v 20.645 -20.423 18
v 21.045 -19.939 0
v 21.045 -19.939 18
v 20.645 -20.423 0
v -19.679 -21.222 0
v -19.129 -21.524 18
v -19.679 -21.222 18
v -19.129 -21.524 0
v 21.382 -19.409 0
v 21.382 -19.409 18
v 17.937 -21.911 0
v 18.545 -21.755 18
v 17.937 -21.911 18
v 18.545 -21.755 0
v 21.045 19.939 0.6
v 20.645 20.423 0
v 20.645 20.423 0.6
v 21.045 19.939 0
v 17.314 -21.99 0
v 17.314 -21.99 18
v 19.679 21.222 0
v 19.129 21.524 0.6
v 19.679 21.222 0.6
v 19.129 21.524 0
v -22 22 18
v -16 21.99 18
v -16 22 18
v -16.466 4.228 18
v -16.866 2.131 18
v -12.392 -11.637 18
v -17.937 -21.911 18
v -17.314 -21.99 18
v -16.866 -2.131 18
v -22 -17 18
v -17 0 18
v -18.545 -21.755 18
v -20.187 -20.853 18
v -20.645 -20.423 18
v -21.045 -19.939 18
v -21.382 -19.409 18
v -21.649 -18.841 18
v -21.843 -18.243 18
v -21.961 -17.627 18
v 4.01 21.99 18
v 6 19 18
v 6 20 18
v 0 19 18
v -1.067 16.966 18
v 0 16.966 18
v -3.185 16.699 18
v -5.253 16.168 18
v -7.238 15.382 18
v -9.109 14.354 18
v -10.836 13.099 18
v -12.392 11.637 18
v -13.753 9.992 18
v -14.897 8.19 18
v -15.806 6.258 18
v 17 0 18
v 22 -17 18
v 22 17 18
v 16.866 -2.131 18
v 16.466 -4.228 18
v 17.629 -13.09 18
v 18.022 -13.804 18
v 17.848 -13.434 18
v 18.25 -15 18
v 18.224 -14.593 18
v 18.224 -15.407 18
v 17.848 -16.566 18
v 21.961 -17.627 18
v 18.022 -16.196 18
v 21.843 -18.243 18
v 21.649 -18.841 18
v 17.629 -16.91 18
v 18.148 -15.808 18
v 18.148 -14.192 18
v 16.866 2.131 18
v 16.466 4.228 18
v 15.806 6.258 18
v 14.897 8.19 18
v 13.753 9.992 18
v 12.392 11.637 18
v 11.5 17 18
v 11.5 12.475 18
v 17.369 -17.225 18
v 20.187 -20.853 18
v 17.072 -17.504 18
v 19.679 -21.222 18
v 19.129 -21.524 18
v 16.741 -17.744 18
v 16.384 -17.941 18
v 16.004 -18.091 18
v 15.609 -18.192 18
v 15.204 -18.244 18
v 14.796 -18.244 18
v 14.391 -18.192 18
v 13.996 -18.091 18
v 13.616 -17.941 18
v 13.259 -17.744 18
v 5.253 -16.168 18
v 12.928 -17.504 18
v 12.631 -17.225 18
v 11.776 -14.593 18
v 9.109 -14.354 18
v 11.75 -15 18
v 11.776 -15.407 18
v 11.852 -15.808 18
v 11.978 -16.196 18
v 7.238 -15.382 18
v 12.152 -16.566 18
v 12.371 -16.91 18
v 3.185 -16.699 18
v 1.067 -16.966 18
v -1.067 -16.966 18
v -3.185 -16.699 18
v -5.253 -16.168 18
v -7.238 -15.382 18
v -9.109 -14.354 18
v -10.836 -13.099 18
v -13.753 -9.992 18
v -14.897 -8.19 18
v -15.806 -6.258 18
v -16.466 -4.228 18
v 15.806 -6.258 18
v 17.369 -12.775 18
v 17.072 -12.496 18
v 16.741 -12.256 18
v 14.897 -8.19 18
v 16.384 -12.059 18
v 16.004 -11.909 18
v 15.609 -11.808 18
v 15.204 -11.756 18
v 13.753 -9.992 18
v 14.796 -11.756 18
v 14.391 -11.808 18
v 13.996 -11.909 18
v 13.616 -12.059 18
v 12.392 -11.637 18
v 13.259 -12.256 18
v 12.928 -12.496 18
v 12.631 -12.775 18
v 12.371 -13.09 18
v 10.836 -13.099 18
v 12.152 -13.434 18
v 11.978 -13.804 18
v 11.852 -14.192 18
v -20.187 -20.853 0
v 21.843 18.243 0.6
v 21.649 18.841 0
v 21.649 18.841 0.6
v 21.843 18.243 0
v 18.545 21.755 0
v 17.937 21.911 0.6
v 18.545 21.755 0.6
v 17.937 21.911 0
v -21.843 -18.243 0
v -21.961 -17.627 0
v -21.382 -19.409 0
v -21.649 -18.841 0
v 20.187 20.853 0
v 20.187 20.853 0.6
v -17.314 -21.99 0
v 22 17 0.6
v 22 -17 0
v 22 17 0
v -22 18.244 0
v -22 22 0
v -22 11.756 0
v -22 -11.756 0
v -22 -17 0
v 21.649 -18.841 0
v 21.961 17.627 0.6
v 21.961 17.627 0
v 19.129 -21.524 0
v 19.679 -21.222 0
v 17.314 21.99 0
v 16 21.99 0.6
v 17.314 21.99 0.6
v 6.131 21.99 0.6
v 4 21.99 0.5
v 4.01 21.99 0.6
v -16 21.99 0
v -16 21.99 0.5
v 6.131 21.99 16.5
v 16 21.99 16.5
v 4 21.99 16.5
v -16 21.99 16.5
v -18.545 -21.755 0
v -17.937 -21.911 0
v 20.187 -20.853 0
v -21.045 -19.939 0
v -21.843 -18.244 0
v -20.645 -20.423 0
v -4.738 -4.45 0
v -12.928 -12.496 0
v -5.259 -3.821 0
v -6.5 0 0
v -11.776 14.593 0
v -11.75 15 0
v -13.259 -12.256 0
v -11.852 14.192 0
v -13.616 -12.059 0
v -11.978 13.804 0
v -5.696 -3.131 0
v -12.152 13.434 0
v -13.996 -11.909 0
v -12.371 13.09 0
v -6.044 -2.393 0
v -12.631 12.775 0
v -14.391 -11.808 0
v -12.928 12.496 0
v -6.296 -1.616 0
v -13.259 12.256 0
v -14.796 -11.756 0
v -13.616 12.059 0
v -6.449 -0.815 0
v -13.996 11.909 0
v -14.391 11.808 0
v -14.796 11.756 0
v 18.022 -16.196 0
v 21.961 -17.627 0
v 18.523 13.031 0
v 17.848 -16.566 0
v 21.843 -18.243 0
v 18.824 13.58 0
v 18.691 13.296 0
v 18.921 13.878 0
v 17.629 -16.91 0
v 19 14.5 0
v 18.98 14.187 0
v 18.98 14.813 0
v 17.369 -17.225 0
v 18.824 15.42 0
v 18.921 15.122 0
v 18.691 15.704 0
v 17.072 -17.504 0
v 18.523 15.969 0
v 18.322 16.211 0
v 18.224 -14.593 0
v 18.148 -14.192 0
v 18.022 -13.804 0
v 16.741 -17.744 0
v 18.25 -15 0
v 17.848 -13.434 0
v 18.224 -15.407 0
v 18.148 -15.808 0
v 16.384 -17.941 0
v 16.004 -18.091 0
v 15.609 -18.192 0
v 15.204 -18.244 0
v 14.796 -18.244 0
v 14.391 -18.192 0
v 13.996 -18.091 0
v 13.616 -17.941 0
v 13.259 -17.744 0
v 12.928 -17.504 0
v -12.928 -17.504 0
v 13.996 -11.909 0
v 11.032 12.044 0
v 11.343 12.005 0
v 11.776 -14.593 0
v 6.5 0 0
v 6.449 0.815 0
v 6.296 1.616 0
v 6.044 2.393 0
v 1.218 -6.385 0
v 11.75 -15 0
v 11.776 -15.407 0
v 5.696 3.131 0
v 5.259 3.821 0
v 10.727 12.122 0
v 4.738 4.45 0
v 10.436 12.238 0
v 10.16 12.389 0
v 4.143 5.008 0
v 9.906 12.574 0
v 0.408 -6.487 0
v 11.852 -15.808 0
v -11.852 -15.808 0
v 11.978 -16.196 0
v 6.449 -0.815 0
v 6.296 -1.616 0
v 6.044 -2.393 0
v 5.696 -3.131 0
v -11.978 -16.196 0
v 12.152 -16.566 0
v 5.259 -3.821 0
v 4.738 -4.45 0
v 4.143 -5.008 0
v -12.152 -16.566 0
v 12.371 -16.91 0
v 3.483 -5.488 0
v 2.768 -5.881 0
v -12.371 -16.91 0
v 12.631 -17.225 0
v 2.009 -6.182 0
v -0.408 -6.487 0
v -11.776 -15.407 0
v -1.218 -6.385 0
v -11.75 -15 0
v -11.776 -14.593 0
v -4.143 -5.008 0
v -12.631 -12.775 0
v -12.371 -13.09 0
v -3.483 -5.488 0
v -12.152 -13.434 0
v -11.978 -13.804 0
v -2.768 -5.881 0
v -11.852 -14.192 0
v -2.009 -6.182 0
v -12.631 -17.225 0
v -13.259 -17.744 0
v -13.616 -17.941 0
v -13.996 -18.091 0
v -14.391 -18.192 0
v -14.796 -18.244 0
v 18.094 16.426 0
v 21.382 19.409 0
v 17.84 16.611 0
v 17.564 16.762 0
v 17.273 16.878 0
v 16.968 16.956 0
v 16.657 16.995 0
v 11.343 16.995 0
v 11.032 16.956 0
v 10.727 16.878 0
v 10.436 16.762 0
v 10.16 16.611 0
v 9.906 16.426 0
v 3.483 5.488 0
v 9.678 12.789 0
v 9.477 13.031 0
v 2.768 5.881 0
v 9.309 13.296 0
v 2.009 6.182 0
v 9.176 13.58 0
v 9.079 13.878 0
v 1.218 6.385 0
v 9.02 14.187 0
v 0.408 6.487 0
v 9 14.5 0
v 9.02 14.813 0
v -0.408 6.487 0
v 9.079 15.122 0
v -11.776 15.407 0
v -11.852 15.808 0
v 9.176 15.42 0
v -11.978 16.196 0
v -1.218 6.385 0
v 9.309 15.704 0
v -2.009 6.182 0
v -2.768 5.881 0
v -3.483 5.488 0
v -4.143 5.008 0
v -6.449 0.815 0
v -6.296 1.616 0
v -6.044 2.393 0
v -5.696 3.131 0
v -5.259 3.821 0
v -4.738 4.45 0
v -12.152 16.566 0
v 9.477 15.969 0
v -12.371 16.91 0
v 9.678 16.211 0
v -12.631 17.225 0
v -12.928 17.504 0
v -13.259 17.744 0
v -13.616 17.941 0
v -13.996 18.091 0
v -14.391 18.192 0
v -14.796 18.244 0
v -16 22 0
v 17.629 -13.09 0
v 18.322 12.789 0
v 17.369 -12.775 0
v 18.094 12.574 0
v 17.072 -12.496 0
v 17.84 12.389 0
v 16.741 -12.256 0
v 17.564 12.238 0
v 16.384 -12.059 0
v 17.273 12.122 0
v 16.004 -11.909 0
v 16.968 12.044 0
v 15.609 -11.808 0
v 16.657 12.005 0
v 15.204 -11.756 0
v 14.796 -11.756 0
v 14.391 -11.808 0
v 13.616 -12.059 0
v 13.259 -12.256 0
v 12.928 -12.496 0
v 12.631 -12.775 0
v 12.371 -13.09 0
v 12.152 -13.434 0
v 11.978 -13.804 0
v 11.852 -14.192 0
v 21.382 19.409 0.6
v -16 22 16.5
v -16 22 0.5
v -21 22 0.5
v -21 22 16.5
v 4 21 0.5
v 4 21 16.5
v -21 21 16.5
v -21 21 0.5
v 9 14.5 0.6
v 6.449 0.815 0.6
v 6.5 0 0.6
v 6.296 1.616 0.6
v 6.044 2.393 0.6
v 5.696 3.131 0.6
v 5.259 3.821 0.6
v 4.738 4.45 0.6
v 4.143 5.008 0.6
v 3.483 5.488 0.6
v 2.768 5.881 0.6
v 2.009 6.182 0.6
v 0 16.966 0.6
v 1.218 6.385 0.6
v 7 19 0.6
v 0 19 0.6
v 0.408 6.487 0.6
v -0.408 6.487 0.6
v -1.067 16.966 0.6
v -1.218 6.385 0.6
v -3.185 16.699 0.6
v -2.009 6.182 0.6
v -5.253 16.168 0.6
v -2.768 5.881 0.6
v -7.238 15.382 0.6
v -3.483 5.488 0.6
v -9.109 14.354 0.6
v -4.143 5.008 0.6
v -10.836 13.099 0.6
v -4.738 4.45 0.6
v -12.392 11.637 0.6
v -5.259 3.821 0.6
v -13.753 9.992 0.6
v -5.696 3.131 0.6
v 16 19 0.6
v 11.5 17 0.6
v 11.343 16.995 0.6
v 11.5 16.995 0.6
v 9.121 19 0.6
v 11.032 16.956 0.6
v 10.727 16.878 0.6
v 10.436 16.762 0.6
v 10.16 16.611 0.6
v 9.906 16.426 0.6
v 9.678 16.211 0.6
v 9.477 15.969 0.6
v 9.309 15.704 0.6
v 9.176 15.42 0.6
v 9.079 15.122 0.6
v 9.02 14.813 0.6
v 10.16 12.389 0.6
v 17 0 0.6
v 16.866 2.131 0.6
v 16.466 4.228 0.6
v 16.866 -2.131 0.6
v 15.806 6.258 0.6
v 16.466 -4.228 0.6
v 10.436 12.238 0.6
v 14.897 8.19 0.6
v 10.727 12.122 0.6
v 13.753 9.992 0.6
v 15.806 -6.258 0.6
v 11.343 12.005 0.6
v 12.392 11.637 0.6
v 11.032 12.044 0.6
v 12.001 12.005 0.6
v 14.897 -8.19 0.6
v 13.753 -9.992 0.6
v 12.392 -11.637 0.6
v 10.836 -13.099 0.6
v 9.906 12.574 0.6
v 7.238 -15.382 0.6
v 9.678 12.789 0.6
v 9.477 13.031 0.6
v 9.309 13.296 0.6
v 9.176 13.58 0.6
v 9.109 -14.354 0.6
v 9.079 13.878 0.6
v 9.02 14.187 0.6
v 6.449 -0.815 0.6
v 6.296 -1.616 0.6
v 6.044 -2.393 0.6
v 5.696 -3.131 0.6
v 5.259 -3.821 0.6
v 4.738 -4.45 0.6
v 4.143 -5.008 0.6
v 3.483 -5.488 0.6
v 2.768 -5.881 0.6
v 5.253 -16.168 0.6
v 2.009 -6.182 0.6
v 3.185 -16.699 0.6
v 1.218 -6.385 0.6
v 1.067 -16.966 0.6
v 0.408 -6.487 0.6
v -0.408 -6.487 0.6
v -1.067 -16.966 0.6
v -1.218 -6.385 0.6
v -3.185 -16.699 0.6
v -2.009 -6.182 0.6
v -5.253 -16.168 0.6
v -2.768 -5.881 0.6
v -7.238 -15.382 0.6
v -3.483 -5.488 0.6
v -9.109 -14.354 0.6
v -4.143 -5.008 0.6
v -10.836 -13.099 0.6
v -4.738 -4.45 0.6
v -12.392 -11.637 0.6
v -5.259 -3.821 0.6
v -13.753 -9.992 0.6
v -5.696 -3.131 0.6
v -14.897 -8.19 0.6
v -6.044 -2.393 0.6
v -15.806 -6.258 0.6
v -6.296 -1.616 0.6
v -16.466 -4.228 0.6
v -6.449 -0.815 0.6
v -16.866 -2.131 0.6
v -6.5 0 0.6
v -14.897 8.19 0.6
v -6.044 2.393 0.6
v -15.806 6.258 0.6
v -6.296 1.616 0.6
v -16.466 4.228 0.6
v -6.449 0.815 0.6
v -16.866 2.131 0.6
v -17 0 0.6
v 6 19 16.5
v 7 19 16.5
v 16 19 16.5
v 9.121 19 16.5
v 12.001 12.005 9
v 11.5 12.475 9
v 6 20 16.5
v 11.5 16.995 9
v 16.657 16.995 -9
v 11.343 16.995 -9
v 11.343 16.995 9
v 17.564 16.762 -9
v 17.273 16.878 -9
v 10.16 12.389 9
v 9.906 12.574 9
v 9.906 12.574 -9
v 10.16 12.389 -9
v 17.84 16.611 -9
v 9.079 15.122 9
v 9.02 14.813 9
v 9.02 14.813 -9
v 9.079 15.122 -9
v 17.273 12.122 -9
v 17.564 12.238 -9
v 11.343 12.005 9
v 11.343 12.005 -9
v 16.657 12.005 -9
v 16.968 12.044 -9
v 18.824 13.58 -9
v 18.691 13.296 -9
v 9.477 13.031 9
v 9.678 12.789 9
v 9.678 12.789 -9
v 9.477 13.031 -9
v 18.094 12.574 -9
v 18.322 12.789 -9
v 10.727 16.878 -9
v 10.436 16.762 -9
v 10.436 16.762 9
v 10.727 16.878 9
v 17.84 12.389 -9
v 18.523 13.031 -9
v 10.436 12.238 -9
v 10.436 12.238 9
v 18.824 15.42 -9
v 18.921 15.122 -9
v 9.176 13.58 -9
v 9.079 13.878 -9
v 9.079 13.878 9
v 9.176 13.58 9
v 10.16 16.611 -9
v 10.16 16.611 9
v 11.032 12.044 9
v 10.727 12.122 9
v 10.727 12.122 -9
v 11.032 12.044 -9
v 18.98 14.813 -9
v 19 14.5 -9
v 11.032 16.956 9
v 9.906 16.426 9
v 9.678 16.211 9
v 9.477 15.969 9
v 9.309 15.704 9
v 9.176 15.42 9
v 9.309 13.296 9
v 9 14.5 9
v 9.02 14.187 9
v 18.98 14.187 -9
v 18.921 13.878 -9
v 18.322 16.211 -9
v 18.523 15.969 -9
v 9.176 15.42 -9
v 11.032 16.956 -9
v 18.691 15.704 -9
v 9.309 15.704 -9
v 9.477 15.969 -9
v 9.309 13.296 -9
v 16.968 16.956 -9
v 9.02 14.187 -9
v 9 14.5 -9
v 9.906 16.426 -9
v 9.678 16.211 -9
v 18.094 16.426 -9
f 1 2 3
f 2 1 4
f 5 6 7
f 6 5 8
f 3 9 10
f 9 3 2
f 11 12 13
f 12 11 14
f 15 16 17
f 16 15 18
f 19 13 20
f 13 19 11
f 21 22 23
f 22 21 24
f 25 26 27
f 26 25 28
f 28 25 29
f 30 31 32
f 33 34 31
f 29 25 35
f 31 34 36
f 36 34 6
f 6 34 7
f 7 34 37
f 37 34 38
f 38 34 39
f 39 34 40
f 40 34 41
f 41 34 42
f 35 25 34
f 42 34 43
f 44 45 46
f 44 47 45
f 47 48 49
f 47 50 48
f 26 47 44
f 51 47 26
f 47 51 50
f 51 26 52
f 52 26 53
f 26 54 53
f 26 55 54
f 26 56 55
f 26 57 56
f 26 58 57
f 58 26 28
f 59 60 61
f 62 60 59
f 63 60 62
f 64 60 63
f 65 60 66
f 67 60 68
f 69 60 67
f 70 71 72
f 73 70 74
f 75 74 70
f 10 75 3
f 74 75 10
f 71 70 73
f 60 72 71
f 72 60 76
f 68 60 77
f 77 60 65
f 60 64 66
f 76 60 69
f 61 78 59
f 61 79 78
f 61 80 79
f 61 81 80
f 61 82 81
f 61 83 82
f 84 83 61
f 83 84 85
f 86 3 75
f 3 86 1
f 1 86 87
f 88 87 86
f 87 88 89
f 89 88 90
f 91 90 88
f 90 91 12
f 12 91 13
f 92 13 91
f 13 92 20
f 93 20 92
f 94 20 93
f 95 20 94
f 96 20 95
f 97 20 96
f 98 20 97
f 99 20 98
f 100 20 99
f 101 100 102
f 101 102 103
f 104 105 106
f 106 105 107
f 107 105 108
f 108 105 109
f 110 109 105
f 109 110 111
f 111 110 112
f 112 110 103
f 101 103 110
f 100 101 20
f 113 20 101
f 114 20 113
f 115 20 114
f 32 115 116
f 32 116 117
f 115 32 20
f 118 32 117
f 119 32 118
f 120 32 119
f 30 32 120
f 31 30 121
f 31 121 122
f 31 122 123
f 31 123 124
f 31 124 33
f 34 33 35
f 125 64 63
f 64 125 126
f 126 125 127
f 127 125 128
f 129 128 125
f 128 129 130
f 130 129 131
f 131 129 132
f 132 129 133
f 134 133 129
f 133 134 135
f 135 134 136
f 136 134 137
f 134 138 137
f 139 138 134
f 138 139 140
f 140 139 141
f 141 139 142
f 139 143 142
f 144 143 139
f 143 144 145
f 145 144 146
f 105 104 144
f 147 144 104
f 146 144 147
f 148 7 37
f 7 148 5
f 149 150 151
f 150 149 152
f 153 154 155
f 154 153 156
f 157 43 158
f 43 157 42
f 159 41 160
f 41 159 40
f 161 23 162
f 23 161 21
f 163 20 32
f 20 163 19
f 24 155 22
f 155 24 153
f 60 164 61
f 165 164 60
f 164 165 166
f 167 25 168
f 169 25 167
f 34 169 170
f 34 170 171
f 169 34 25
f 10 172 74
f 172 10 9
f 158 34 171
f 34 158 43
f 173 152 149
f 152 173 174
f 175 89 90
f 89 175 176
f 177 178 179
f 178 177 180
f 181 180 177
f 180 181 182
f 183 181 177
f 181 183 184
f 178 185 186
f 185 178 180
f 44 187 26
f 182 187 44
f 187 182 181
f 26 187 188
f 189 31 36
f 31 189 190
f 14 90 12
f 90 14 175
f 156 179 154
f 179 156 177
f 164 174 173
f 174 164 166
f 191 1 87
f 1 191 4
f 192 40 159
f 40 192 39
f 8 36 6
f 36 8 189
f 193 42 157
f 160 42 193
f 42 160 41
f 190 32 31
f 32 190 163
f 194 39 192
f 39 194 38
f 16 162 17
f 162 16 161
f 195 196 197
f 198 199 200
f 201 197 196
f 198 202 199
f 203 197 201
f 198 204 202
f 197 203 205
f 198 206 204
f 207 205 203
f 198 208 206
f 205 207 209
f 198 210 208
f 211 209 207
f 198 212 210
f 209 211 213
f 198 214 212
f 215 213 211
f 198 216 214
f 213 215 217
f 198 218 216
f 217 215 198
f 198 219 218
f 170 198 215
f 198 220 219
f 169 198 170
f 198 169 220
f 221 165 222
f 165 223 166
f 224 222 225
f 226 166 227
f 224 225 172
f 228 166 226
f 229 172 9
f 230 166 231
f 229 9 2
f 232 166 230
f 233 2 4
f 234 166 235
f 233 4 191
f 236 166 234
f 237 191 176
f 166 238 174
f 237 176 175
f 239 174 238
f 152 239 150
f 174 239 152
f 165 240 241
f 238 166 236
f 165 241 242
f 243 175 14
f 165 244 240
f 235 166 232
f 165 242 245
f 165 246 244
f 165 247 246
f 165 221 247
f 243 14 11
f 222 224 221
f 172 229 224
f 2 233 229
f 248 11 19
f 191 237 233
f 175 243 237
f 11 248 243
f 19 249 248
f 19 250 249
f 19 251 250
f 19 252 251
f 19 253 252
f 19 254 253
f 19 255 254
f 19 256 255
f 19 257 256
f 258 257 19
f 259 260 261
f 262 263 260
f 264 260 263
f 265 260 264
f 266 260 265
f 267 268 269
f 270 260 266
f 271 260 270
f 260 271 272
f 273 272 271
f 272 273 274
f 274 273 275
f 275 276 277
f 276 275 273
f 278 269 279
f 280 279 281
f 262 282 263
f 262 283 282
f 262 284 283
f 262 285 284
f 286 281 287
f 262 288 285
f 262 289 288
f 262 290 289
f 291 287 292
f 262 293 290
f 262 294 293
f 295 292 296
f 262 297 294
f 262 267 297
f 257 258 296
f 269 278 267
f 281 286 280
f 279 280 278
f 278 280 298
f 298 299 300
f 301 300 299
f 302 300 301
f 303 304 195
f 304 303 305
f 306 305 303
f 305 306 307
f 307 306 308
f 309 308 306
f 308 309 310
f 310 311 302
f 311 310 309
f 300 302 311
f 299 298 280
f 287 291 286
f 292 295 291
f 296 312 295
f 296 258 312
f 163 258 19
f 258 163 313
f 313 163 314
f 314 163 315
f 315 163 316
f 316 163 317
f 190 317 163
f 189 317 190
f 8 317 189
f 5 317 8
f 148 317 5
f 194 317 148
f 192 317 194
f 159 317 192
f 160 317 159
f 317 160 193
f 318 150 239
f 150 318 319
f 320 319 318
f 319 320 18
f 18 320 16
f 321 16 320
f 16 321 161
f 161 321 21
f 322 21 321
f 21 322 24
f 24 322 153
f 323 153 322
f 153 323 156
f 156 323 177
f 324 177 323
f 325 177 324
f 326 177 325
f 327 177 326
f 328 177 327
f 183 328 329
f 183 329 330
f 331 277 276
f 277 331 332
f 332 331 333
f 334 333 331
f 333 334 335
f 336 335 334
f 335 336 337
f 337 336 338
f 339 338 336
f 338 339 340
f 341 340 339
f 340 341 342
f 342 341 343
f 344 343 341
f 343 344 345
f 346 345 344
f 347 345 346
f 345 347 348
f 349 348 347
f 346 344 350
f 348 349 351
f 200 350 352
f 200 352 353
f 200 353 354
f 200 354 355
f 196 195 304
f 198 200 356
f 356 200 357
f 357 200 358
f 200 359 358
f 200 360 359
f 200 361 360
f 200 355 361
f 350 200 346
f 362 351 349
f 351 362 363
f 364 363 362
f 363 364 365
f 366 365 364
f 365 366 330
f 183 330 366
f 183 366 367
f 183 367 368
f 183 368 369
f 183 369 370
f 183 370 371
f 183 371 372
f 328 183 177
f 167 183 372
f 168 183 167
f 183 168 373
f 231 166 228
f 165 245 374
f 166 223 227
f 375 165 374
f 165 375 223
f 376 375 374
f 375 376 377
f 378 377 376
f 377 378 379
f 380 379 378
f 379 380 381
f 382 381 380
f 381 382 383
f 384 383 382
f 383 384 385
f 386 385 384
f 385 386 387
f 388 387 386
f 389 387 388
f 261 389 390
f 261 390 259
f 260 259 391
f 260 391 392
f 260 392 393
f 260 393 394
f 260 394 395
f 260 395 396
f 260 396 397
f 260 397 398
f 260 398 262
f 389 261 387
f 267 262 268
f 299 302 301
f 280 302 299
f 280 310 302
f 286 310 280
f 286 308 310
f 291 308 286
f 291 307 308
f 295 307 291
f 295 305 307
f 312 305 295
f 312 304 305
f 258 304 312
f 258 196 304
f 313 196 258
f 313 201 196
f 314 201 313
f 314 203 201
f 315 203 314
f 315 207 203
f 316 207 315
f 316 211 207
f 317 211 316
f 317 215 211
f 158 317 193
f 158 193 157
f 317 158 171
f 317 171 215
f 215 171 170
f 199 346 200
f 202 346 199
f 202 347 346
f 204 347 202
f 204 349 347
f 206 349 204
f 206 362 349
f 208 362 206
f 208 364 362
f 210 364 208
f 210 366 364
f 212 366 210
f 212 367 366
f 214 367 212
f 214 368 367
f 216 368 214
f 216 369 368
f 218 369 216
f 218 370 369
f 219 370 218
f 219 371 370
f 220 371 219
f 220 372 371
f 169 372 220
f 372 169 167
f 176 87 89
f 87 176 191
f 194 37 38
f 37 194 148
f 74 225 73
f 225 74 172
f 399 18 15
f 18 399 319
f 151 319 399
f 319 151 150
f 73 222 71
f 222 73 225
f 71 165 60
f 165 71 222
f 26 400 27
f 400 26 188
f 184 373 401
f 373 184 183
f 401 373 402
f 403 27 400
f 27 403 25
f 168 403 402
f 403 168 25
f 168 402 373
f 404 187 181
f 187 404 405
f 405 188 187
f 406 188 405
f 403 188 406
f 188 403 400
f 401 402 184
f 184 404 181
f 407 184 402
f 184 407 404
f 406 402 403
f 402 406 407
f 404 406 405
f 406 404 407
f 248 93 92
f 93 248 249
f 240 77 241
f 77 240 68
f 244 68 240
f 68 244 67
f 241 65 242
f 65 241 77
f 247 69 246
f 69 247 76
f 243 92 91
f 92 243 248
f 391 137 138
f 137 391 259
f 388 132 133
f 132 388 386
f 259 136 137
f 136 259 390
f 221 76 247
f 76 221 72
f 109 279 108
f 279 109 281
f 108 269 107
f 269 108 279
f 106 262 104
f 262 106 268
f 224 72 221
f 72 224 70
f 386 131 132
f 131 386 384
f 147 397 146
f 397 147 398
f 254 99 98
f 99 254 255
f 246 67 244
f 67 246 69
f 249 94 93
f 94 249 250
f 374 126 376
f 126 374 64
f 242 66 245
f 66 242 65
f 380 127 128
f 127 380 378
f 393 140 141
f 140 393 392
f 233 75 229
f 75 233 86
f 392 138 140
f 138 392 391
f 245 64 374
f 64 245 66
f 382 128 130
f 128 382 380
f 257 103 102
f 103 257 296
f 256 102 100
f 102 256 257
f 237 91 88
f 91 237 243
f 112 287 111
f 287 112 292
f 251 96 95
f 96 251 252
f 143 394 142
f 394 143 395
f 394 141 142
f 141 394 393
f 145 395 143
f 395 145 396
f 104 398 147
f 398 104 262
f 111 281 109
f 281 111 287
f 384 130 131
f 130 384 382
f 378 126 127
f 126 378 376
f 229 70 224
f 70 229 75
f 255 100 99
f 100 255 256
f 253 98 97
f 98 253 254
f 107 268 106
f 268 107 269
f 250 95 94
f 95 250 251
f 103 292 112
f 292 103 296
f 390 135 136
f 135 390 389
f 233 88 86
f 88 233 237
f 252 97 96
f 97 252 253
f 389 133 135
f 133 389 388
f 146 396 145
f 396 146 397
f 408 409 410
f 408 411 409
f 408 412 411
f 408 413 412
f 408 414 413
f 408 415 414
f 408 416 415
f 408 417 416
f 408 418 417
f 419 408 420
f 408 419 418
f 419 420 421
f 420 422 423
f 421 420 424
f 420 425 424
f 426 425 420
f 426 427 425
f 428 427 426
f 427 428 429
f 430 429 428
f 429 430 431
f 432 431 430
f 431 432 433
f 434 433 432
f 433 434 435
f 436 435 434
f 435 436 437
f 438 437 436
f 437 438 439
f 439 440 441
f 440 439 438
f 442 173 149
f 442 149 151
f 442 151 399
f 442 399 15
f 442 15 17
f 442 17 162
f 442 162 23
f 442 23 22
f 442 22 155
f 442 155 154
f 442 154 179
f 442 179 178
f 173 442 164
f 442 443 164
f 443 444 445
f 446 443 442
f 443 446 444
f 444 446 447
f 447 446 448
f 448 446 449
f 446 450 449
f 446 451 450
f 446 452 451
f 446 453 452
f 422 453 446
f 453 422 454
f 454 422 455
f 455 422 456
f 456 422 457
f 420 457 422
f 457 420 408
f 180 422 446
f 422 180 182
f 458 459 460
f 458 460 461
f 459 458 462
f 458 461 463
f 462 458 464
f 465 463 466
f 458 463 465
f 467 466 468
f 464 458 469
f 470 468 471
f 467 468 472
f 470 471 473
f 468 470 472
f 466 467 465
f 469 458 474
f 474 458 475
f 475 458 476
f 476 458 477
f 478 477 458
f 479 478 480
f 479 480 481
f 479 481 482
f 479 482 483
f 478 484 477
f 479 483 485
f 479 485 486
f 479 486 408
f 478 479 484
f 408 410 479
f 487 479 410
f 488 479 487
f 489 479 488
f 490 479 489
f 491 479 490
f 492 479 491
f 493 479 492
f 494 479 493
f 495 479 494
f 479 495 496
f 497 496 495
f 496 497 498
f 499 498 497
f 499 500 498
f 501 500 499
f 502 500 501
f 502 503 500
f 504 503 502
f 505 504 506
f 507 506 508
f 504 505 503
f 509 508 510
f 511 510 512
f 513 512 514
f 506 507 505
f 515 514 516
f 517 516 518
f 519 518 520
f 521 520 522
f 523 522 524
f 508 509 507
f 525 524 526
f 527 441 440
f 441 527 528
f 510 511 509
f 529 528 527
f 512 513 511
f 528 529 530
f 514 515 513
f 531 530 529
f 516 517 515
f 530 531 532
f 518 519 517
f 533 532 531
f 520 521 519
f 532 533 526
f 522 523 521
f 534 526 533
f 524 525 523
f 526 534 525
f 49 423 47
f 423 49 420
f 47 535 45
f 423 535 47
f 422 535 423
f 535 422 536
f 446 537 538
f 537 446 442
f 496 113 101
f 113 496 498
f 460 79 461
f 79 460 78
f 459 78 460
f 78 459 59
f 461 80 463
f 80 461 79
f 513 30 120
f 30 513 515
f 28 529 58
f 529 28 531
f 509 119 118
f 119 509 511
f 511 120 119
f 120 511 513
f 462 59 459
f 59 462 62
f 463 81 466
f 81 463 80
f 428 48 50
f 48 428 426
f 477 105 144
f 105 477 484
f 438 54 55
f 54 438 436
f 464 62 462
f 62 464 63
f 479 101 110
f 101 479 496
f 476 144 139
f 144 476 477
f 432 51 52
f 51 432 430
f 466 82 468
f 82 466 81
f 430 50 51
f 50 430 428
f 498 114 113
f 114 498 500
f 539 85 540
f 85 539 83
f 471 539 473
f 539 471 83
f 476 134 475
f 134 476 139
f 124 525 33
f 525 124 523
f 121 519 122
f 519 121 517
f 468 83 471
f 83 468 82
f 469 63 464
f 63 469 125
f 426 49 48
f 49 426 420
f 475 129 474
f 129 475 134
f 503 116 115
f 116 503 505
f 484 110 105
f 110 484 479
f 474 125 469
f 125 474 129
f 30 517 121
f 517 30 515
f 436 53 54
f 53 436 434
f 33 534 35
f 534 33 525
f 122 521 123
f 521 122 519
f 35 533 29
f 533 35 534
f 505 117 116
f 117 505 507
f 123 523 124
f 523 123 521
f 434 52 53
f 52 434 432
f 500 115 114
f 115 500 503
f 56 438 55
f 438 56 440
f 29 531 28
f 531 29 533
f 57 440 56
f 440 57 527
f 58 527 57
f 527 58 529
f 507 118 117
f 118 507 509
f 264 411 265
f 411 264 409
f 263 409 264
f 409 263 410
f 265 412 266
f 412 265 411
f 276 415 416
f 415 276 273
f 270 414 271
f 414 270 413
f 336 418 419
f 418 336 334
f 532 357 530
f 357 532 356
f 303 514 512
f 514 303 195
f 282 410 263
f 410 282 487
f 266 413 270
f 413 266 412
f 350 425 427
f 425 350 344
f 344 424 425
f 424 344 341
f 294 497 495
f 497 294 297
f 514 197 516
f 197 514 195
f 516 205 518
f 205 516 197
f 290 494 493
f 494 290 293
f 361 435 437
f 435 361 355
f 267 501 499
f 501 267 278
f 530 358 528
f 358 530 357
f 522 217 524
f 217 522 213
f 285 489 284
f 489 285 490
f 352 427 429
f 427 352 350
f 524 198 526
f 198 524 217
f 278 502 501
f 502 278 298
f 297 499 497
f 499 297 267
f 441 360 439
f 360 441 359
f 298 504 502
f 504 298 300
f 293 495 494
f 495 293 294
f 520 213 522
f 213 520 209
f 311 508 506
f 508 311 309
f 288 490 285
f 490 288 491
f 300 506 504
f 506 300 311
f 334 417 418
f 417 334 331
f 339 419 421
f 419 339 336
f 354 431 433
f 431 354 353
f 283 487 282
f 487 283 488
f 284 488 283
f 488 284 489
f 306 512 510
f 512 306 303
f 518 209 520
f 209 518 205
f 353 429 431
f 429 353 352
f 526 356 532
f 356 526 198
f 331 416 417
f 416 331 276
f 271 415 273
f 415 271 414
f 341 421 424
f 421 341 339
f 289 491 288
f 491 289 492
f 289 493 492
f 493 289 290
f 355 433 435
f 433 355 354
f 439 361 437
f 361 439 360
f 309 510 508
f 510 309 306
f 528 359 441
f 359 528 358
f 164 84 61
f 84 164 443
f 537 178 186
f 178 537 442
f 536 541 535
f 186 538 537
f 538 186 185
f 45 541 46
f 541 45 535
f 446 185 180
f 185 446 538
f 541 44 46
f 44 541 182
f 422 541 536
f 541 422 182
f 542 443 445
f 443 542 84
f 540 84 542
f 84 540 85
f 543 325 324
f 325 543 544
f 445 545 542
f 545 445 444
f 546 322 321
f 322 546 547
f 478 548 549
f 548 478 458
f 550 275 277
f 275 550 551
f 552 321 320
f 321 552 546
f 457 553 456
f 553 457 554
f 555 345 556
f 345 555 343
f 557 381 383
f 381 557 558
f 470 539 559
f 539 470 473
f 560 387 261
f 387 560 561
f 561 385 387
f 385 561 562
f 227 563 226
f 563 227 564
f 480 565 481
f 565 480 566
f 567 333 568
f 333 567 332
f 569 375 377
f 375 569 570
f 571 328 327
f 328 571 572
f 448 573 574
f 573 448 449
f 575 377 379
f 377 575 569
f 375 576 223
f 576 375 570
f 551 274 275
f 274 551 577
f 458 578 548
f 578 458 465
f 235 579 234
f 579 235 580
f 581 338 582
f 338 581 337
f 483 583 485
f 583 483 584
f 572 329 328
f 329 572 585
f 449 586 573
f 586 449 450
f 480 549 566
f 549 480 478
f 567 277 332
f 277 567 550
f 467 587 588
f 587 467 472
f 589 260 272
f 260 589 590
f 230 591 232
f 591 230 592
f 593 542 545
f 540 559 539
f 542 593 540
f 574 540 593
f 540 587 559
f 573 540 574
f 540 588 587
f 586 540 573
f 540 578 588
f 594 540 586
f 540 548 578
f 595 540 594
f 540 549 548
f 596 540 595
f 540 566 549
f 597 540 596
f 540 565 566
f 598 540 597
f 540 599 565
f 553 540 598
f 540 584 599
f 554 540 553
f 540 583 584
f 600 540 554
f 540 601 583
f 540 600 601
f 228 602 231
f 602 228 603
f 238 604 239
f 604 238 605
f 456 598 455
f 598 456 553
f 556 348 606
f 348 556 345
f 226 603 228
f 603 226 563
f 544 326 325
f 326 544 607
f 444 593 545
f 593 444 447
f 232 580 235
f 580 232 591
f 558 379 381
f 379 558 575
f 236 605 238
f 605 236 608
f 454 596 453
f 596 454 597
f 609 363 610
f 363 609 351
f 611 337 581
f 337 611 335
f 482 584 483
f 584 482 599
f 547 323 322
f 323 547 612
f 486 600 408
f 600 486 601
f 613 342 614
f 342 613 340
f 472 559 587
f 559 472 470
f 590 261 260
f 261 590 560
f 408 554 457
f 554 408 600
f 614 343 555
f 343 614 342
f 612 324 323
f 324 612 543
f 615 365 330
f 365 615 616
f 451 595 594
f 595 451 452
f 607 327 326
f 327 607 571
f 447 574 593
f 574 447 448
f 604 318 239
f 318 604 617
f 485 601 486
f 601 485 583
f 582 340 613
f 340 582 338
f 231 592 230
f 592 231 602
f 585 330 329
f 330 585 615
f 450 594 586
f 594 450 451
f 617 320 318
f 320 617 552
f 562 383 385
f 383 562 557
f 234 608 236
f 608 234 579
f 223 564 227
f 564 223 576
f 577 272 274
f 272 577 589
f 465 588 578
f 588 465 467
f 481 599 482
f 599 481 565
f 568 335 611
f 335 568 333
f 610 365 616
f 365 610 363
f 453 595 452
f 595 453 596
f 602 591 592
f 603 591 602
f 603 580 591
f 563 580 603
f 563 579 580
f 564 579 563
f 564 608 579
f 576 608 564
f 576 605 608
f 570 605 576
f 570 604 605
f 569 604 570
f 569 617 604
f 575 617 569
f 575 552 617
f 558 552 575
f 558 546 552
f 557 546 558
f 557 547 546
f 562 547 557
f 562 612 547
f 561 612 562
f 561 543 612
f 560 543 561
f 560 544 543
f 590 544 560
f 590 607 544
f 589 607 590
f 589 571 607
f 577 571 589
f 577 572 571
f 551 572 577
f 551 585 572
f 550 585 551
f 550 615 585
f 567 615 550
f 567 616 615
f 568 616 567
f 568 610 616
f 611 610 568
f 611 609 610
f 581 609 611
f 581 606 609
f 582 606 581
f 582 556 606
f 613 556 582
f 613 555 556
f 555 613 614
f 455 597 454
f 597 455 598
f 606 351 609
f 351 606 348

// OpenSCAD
$fn = 50;


union() {
	difference() {
		union() {
			hull() {
				translate(v = [-17.0000000000, 17.0000000000, 0]) {
					cylinder(h = 18, r = 5);
				}
				translate(v = [17.0000000000, 17.0000000000, 0]) {
					cylinder(h = 18, r = 5);
				}
				translate(v = [-17.0000000000, -17.0000000000, 0]) {
					cylinder(h = 18, r = 5);
				}
				translate(v = [17.0000000000, -17.0000000000, 0]) {
					cylinder(h = 18, r = 5);
				}
			}
			translate(v = [-22.0000000000, 16.0000000000, 0]) {
				cube(size = [6, 6, 18]);
			}
		}
		union() {
			translate(v = [-22.5000000000, -15.0000000000, -250.0000000000]) {
				rotate(a = [0, 0, 0]) {
					difference() {
						union() {
							hull() {
								translate(v = [7.5000000000, 0, 0]) {
									cylinder(h = 250, r = 3.2500000000, r1 = 3.2500000000, r2 = 3.2500000000);
								}
								translate(v = [-7.5000000000, 0, 0]) {
									cylinder(h = 250, r = 3.2500000000, r1 = 3.2500000000, r2 = 3.2500000000);
								}
							}
						}
						union();
					}
				}
			}
			translate(v = [-22.5000000000, 15.0000000000, -250.0000000000]) {
				rotate(a = [0, 0, 0]) {
					difference() {
						union() {
							hull() {
								translate(v = [7.5000000000, 0, 0]) {
									cylinder(h = 250, r = 3.2500000000, r1 = 3.2500000000, r2 = 3.2500000000);
								}
								translate(v = [-7.5000000000, 0, 0]) {
									cylinder(h = 250, r = 3.2500000000, r1 = 3.2500000000, r2 = 3.2500000000);
								}
							}
						}
						union();
					}
				}
			}
			translate(v = [-21.0000000000, 21.0000000000, 0.5000000000]) {
				cube(size = [25, 1, 16]);
			}
			translate(v = [15.0000000000, -15.0000000000, 0]) {
				cylinder(h = 100, r = 3.2500000000);
			}
			translate(v = [0.0000000000, 11.0000000000, 0.6000000000]) {
				cube(size = [11, 8, 20.4000000000]);
			}
			translate(v = [0, 0, 0.6000000000]) {
				cylinder(h = 20.4000000000, r = 17.0000000000);
			}
			translate(v = [0, 0, -9.0000000000]) {
				cylinder(h = 18, r = 6.5000000000);
			}
			translate(v = [0.0000000000, 17.0000000000, 0.6000000000]) {
				cube(size = [22.0000000000, 2, 20.4000000000]);
			}
			translate(v = [16.0000000000, 17.0000000000, 0.6000000000]) {
				cube(size = [6, 5, 20.4000000000]);
			}
			translate(v = [6.0000000000, 17.0000000000, 16.5000000000]) {
				cube(size = [16, 5, 1.5000000000]);
			}
			translate(v = [3.2500000000, 22.7500000000, 0.6000000000]) {
				rotate(a = [0, 0, -45]) {
					cube(size = [7.5000000000, 1.5000000000, 20.4000000000]);
				}
			}
			translate(v = [2.5000000000, 12.0000000000, 0.6000000000]) {
				cube(size = [9.0000000000, 5, 17.4000000000]);
			}
		}
	}
	union() {
		translate(v = [14, 14.5000000000, -9.0000000000]) {
			rotate(a = [0, 0, 0]) {
				difference() {
					union() {
						#hull() {
							#translate(v = [2.5000000000, 0, 0]) {
								cylinder(h = 18, r = 2.5000000000, r1 = 2.5000000000, r2 = 2.5000000000);
							}
							#translate(v = [-2.5000000000, 0, 0]) {
								cylinder(h = 18, r = 2.5000000000, r1 = 2.5000000000, r2 = 2.5000000000);
							}
						}
					}
					union();
				}
			}
		}
	}
}
